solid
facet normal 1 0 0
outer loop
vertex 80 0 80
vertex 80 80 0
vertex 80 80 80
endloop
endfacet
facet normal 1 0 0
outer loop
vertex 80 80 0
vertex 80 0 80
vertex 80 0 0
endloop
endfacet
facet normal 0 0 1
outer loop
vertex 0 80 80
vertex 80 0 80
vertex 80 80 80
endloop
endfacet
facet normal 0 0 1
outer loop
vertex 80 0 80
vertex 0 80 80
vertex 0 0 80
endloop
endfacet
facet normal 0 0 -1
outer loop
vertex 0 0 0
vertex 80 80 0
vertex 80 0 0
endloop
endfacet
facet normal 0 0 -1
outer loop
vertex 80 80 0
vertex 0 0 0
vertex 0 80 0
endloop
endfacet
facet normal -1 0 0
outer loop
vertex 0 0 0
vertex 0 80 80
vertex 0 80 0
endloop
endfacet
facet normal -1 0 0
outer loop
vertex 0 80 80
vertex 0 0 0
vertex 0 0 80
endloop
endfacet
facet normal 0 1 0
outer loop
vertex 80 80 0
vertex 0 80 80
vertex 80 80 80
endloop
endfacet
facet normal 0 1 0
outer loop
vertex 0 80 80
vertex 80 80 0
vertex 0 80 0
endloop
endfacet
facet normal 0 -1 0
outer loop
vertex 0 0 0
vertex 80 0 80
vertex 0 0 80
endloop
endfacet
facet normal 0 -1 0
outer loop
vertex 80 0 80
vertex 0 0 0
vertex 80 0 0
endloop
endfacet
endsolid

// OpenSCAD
// file: cube.scad
module labeled_cube(corner, size) {
    edges = [
        [size/2, 0, 0],
        [size, size/2, 0],
        [size/2, size, 0],
        [0, size/2, 0],
        [size/2, 0, size],
        [size, size/2, size],
        [size/2, size, size[2]],
        [0, size/2, size],
        [0, 0, size/2],
        [size, 0, size/2],
        [size, size, size/2],
        [0, size, size/2],
    ];

    corners = [
        [0, 0, 0],
        [size, 0, 0],
        [size, size, 0],
        [0, size, 0],
        [0, 0, size],
        [size, 0, size],
        [size, size, size],
        [0, size, size],
    ];

  translate(corner) {
    color([1, 1, 1, 0.5]) cube(size, center=false); // create a transparent cube with the given size, centered at the given corner coordinates

    // label the corner points
    translate([0, 0, -5]) rotate([90, 0, 0]) text("C12", size=5);
    translate([size[0], 0, -5]) rotate([90, 0, 0]) text("C13", size=5);
    translate([size[0], size[1], -5]) rotate([90, 0, 0]) text("C14", size=5);
    translate([0, size[1], -5]) rotate([90, 0, 0]) text("C15", size=5);
    translate([0, 0, size[2]]) rotate([90, 0, 0]) text("C16", size=5);
    translate([size[0], 0, size[2]]) rotate([90, 0, 0]) text("C17", size=5);
    translate([size[0], size[1], size[2]]) rotate([90, 0, 0]) text("C18", size=5);
    translate([0, size[1], size[2]]) rotate([90, 0, 0]) text("C19", size=5);

    // label the edges
    translate([size[0]/2, 0, -5]) rotate([90, 0, 0]) text("E0", size=5);
    translate([size[0], size[1]/2, -5]) rotate([90, 0, 90]) text("E1", size=5);
    translate([size[0]/2+5, size[1], -5]) rotate([90, 0, 180]) text("E2", size=5);
    translate([0, size[1]/2, -5]) rotate([90, 0, -90]) text("E3", size=5);
    translate([size[0]/2, 0, size[2]+2]) rotate([90, 0, 0]) text("E4", size=5);
    translate([size[0], size[1]/2-3, size[2]+2]) rotate([90, 0, 90]) text("E5", size=5);
    translate([size[0]/2, size[1], size[2]+2]) rotate([90, 0, 180]) text("E6", size=5);
    translate([0, size[1]/2+3, size[2]+2]) rotate([90, 0, -90]) text("E7", size=5);
    translate([-1, 0, size[2]/2]) rotate([0, -90, 90]) text("E8", size=5);
    translate([size[0]+5, 0, size[2]/2]) rotate([90, -90, 0]) text("E9", size=5);
    translate([size[0]+1, size[1], size[2]/2]) rotate([180, -90, 90]) text("E10", size=5);
    translate([-1, size[1], size[2]/2]) rotate([0, -90, 0]) text("E11", size=5);
  }
}
// main file
// When all 8 corners of the cube have zero or negative values.
// It means the whole cube is on/inside the 3D model.
// In this case, 6 tetrahedra are generated for the whole cube.

use <cube.scad>

module divide_cube_into_tetrahedra(cube_size, alpha=0.5, colors=[
    [1, 0, 0, alpha],  // red
    [0, 1, 0, alpha],  // green
    [0, 0, 1, alpha],  // blue
    [1, 1, 0, alpha],  // yellow
    [1, 0, 1, alpha],  // magenta
    [0, 1, 1, alpha]   // cyan
]) {
    // Define the vertices of the cube
    cube_vertices = [
        [0, 0, 0],
        [cube_size, 0, 0],
        [cube_size, cube_size, 0],
        [0, cube_size, 0],
        [0, 0, cube_size],
        [cube_size, 0, cube_size],
        [cube_size, cube_size, cube_size],
        [0, cube_size, cube_size],
    ];

    tetrahedron_indices = [
        [0, 4, 7, 6],
        [0, 3, 7, 6],
        [0, 4, 5, 6],
        [0, 1, 5, 6],
        [0, 3, 2, 6],
        [0, 1, 2, 6],
    ];

    // Define the tetrahedra by selecting vertices from the cube
    for (i = [0:5]) {
        // Define the indices of the vertices for the tetrahedron
        vertex_indices = tetrahedron_indices[i];

        // Define the vertices of the tetrahedron
        tetrahedron_vertices = [
            cube_vertices[vertex_indices[0]],
            cube_vertices[vertex_indices[1]],
            cube_vertices[vertex_indices[2]],
            cube_vertices[vertex_indices[3]]
        ];

        // Color the tetrahedron with the specified color
        color(colors[i]) polyhedron(points=tetrahedron_vertices, faces=[[0, 1, 2], [0, 2, 3], [0, 3, 1], [1, 2, 3]]);
    }

    // Draw the cube
    color([1, 1, 1, 0]) cube(cube_size);
}

module labeled_and_divided_cube(cube_size, alpha=0.5, colors=[
    [1, 0, 0, alpha],  // red
    [0, 1, 0, alpha],  // green
    [0, 0, 1, alpha],  // blue
    [1, 1, 0, alpha],  // yellow
    [1, 0, 1, alpha],  // magenta
    [0, 1, 1, alpha]   // cyan
]) {
    // Define the center of the cube
    center = [cube_size/2, cube_size/2, cube_size/2];

    // Label the corners of the cube
    labeled_cube([0, 0, 0], [cube_size, cube_size, cube_size]);

    // Divide the cube into tetrahedra
    divide_cube_into_tetrahedra(cube_size, alpha, colors);
}

// Example usage of the module
cube_size = 80;
alpha = 0.5;
colors = [
    [1, 0, 0, alpha],  // red
    [0, 1, 0, alpha],  // green
    [0, 0, 1, alpha],  // blue
    [1, 1, 0, alpha],  // yellow
    [1, 0, 1, alpha],  // magenta
    [0, 1, 1, alpha]   // cyan
];

labeled_and_divided_cube(cube_size, alpha, colors);
